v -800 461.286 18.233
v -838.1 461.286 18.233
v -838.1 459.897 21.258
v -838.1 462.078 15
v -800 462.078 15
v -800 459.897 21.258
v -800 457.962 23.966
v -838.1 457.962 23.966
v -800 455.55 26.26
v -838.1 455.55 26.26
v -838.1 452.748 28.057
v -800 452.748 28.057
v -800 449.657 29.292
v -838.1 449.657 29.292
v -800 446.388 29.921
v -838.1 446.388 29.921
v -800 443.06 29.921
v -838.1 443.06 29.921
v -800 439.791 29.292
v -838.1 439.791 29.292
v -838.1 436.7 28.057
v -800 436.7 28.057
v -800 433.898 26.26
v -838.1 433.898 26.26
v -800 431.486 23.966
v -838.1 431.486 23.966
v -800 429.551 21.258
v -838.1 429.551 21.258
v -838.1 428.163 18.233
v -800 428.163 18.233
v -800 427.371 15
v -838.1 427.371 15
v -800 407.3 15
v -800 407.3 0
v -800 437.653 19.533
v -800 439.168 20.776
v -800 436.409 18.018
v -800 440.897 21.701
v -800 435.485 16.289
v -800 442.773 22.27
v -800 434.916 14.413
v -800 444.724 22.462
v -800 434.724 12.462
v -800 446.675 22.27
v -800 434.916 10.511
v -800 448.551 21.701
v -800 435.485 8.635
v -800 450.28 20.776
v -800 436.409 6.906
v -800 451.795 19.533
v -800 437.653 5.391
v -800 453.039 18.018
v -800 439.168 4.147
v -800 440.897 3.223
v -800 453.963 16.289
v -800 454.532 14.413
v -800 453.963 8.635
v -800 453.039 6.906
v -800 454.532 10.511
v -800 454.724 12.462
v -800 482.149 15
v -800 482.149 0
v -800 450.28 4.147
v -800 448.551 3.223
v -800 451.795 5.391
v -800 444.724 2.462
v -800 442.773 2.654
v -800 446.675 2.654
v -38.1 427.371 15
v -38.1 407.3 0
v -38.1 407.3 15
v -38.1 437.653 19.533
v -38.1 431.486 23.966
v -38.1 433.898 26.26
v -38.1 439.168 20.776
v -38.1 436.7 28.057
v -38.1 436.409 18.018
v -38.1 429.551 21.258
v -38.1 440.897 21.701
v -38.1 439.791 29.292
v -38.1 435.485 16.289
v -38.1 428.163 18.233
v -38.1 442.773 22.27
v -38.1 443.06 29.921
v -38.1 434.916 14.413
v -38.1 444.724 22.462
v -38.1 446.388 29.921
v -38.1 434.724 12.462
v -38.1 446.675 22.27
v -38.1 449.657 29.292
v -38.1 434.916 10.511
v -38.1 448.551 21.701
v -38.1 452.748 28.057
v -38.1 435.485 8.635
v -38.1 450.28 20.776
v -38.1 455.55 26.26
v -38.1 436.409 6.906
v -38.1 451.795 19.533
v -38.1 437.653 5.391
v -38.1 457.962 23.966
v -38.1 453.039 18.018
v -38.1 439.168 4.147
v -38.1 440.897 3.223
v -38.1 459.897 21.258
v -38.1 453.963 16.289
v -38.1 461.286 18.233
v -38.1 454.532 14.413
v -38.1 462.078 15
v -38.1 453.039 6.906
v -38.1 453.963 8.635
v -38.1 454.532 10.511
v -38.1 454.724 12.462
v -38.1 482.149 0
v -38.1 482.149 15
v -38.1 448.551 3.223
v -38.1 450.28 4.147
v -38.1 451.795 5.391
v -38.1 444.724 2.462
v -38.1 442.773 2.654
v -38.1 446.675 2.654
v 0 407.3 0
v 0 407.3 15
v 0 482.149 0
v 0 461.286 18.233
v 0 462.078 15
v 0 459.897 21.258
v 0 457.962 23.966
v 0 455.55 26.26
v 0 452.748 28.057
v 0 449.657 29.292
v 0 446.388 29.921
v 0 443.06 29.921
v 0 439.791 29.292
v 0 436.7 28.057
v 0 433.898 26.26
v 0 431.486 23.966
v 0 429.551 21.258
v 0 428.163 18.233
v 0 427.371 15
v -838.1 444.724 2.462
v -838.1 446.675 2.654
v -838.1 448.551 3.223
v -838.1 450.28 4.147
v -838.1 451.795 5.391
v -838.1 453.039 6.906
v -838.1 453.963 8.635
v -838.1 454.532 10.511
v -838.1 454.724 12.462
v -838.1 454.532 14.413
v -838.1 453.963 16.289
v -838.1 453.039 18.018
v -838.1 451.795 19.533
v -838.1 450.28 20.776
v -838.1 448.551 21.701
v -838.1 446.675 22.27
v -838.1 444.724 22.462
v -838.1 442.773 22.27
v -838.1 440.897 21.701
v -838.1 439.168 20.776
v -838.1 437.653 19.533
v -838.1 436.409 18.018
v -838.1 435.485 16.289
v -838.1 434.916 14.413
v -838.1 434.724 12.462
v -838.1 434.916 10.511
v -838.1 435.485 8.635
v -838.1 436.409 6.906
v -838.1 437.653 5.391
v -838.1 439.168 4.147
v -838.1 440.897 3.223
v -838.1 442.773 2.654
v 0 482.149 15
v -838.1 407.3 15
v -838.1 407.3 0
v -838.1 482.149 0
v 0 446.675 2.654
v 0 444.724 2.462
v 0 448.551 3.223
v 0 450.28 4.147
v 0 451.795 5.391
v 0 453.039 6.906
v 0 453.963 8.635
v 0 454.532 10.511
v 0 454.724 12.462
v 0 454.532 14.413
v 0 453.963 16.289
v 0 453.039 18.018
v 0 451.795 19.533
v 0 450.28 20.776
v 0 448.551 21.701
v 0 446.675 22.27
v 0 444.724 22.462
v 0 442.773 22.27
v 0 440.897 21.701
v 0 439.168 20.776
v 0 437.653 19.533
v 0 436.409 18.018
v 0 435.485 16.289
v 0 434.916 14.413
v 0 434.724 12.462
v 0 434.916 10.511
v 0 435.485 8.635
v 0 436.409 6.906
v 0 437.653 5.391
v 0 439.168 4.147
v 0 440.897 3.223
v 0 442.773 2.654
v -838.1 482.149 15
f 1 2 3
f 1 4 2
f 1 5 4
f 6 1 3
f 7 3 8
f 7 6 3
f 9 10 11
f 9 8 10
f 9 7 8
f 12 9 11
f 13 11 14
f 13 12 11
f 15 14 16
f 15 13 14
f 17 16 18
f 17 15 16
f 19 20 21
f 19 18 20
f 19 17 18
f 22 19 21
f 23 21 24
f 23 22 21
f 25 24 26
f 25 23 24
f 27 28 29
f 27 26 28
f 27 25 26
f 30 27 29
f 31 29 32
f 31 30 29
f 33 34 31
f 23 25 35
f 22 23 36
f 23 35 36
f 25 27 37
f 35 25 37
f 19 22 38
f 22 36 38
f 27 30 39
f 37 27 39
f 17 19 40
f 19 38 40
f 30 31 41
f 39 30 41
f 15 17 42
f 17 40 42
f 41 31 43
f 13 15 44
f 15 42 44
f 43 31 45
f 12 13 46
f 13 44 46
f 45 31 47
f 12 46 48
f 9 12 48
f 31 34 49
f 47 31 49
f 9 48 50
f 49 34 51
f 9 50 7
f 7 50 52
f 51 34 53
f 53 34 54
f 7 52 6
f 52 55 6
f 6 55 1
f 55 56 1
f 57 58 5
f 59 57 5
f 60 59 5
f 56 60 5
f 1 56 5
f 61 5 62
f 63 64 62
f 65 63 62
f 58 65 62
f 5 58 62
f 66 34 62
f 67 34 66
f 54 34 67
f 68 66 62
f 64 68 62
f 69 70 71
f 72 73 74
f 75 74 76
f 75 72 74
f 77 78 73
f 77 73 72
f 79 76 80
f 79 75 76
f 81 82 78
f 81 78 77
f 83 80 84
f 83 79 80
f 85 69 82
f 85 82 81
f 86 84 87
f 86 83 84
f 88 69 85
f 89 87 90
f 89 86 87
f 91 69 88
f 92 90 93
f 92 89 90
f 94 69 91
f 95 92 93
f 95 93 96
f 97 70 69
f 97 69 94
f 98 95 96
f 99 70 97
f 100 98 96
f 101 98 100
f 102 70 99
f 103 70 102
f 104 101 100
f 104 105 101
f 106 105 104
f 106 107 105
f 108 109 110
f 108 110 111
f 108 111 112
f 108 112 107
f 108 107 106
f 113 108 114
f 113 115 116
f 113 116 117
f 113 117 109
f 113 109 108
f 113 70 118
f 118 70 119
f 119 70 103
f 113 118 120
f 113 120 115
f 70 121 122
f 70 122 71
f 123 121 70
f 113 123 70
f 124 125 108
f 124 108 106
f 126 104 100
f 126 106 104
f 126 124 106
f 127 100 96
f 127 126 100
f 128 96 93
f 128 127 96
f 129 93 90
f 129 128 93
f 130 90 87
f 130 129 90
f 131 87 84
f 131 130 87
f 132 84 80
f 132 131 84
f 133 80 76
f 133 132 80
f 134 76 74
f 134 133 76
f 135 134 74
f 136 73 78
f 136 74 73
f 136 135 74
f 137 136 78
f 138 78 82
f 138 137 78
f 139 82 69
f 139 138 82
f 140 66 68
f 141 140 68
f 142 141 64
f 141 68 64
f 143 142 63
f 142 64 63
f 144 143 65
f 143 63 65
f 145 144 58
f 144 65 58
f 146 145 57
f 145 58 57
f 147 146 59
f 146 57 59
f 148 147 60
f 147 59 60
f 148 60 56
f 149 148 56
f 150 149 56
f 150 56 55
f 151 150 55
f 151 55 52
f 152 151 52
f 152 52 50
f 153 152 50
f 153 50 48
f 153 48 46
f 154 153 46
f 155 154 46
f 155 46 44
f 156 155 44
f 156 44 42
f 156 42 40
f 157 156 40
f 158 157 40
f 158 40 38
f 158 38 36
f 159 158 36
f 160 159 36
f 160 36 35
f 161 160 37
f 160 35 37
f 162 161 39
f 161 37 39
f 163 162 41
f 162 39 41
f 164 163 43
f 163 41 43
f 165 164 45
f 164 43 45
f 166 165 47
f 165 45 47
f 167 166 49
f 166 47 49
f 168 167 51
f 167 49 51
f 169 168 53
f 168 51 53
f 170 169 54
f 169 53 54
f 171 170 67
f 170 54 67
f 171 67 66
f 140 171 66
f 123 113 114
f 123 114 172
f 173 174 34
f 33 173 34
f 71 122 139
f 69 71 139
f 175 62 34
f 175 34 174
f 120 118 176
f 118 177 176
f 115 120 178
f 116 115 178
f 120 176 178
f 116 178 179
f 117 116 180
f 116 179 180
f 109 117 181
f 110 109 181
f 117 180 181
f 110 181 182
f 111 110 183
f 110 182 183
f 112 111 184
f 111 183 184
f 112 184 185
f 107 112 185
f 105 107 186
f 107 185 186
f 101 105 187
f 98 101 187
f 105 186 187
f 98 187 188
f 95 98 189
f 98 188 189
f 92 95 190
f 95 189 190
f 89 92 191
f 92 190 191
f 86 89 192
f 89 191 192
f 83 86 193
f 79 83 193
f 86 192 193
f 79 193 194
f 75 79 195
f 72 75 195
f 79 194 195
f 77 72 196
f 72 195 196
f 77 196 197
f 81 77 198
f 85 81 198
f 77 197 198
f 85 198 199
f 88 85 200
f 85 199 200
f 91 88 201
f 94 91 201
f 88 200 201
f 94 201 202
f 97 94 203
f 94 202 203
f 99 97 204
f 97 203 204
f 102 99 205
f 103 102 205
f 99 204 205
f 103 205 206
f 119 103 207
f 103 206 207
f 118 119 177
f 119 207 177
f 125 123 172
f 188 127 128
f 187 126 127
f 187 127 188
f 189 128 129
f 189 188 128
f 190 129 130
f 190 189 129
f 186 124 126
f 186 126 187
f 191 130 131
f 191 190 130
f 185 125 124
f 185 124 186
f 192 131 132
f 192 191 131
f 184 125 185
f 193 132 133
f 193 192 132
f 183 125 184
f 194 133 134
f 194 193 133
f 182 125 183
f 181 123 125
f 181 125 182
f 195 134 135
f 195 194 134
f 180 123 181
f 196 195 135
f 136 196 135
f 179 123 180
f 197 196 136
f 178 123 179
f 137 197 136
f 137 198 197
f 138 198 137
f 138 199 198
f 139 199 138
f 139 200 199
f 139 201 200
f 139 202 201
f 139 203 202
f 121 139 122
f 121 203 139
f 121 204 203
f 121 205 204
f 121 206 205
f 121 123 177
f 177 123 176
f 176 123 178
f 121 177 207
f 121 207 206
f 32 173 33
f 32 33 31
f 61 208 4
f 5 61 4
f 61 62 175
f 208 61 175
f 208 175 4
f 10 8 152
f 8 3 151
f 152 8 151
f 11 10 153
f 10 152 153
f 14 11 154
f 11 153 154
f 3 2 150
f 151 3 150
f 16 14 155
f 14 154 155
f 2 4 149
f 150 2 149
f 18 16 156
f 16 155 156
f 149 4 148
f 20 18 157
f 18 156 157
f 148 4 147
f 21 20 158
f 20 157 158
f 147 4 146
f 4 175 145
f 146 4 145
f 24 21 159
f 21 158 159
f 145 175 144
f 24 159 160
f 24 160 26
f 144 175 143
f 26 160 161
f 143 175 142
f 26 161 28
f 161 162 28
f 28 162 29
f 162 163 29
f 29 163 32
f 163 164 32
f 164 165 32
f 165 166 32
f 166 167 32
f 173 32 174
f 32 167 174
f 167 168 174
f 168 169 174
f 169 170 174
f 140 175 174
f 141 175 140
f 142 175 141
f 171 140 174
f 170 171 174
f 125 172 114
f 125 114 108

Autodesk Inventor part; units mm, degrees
ref_plane "YZ Plane" through (0, 0, 0) normal (1, 0, 0) x (0, 1, 0)
ref_plane "XZ Plane" through (0, 0, 0) normal (0, 1, 0) x (-1, 0, 0)
ref_plane "XY Plane" through (0, 0, 0) normal (0, 0, 1) x (1, 0, 0)
ref_plane "Work Plane1" through (-838.1, 1200, 0) normal (0, 0, 1) x (-1, 0, 0)
sketch "Sketch1" plane through (-838.1, 1200, 0) normal (0, 0, 1) x (-1, 0, 0)
  line L0 (0, 792.7005) -> (-38.1, 792.7005)
  line L1 (-38.1, 792.7005) -> (-38.1, 717.8512)
  line L2 (-38.1, 717.8512) -> (0, 717.8512)
  line L3 (0, 717.8512) -> (0, 792.7005)
  line L4 (0, 1219.05) -> (0, -19.05) projected
  line L5 (-38.1, 1180.95) -> (-38.1, 19.05) projected
  line L6 (-838.1, 1219.05) -> (0, 1219.05) construction
  line L7 (-419.05, 1219.05) -> (-419.05, -161.3247) construction
  line L8 (-838.1, 792.7005) -> (-800, 792.7005)
  line L9 (-800, 792.7005) -> (-800, 717.8512)
  line L10 (-800, 717.8512) -> (-838.1, 717.8512)
  line L11 (-838.1, 717.8512) -> (-838.1, 792.7005)
  point P0 (-838.1, 1200)
extrude "Extrusion1" add sketch "Sketch1" along normal blind 30
sketch "Sketch3" plane through (0, 407.2995, 0) normal (1, 0, 0) x (0, 0, -1)
  line L0 (0, 0) -> (-30, 0) projected
  line L1 (0, 0) -> (-15, 0)
  line L2 (-15, 0) -> (-15, 20.0711)
  arc A0 (-15, 54.7782) -> (-15, 20.0711) centre (-12.4618, 37.4246) ccw
  line L3 (-30, 0) -> (-30, 74.8493) projected
  line L4 (0, 0) -> (0, 74.8493) projected
  line L5 (0, 37.4246) -> (-30, 37.4246) construction
  line L6 (-15, 74.8493) -> (-15, 54.7782)
  line L7 (0, 74.8493) -> (-30, 74.8493) projected
  line L8 (-15, 74.8493) -> (0, 74.8493) construction
  line L9 (0, 74.8493) -> (0, 0) construction
  circle A1 centre (-12.4618, 37.4246) radius 10
  line L10 (-15, 74.8493) -> (0, 74.8493)
  point P0 (0, -407.2995)
  point P1 (-30, 37.4246)
  dimension "d5" = 20
  dimension "d6" = 17.5382
  dimension "d7" = 15
extrude "Extrusion3" cut sketch "Sketch3" against normal through all contours L0 L3 A0 L2 | L6 A0 L3 L7 | A1
properties part number "Stand"
